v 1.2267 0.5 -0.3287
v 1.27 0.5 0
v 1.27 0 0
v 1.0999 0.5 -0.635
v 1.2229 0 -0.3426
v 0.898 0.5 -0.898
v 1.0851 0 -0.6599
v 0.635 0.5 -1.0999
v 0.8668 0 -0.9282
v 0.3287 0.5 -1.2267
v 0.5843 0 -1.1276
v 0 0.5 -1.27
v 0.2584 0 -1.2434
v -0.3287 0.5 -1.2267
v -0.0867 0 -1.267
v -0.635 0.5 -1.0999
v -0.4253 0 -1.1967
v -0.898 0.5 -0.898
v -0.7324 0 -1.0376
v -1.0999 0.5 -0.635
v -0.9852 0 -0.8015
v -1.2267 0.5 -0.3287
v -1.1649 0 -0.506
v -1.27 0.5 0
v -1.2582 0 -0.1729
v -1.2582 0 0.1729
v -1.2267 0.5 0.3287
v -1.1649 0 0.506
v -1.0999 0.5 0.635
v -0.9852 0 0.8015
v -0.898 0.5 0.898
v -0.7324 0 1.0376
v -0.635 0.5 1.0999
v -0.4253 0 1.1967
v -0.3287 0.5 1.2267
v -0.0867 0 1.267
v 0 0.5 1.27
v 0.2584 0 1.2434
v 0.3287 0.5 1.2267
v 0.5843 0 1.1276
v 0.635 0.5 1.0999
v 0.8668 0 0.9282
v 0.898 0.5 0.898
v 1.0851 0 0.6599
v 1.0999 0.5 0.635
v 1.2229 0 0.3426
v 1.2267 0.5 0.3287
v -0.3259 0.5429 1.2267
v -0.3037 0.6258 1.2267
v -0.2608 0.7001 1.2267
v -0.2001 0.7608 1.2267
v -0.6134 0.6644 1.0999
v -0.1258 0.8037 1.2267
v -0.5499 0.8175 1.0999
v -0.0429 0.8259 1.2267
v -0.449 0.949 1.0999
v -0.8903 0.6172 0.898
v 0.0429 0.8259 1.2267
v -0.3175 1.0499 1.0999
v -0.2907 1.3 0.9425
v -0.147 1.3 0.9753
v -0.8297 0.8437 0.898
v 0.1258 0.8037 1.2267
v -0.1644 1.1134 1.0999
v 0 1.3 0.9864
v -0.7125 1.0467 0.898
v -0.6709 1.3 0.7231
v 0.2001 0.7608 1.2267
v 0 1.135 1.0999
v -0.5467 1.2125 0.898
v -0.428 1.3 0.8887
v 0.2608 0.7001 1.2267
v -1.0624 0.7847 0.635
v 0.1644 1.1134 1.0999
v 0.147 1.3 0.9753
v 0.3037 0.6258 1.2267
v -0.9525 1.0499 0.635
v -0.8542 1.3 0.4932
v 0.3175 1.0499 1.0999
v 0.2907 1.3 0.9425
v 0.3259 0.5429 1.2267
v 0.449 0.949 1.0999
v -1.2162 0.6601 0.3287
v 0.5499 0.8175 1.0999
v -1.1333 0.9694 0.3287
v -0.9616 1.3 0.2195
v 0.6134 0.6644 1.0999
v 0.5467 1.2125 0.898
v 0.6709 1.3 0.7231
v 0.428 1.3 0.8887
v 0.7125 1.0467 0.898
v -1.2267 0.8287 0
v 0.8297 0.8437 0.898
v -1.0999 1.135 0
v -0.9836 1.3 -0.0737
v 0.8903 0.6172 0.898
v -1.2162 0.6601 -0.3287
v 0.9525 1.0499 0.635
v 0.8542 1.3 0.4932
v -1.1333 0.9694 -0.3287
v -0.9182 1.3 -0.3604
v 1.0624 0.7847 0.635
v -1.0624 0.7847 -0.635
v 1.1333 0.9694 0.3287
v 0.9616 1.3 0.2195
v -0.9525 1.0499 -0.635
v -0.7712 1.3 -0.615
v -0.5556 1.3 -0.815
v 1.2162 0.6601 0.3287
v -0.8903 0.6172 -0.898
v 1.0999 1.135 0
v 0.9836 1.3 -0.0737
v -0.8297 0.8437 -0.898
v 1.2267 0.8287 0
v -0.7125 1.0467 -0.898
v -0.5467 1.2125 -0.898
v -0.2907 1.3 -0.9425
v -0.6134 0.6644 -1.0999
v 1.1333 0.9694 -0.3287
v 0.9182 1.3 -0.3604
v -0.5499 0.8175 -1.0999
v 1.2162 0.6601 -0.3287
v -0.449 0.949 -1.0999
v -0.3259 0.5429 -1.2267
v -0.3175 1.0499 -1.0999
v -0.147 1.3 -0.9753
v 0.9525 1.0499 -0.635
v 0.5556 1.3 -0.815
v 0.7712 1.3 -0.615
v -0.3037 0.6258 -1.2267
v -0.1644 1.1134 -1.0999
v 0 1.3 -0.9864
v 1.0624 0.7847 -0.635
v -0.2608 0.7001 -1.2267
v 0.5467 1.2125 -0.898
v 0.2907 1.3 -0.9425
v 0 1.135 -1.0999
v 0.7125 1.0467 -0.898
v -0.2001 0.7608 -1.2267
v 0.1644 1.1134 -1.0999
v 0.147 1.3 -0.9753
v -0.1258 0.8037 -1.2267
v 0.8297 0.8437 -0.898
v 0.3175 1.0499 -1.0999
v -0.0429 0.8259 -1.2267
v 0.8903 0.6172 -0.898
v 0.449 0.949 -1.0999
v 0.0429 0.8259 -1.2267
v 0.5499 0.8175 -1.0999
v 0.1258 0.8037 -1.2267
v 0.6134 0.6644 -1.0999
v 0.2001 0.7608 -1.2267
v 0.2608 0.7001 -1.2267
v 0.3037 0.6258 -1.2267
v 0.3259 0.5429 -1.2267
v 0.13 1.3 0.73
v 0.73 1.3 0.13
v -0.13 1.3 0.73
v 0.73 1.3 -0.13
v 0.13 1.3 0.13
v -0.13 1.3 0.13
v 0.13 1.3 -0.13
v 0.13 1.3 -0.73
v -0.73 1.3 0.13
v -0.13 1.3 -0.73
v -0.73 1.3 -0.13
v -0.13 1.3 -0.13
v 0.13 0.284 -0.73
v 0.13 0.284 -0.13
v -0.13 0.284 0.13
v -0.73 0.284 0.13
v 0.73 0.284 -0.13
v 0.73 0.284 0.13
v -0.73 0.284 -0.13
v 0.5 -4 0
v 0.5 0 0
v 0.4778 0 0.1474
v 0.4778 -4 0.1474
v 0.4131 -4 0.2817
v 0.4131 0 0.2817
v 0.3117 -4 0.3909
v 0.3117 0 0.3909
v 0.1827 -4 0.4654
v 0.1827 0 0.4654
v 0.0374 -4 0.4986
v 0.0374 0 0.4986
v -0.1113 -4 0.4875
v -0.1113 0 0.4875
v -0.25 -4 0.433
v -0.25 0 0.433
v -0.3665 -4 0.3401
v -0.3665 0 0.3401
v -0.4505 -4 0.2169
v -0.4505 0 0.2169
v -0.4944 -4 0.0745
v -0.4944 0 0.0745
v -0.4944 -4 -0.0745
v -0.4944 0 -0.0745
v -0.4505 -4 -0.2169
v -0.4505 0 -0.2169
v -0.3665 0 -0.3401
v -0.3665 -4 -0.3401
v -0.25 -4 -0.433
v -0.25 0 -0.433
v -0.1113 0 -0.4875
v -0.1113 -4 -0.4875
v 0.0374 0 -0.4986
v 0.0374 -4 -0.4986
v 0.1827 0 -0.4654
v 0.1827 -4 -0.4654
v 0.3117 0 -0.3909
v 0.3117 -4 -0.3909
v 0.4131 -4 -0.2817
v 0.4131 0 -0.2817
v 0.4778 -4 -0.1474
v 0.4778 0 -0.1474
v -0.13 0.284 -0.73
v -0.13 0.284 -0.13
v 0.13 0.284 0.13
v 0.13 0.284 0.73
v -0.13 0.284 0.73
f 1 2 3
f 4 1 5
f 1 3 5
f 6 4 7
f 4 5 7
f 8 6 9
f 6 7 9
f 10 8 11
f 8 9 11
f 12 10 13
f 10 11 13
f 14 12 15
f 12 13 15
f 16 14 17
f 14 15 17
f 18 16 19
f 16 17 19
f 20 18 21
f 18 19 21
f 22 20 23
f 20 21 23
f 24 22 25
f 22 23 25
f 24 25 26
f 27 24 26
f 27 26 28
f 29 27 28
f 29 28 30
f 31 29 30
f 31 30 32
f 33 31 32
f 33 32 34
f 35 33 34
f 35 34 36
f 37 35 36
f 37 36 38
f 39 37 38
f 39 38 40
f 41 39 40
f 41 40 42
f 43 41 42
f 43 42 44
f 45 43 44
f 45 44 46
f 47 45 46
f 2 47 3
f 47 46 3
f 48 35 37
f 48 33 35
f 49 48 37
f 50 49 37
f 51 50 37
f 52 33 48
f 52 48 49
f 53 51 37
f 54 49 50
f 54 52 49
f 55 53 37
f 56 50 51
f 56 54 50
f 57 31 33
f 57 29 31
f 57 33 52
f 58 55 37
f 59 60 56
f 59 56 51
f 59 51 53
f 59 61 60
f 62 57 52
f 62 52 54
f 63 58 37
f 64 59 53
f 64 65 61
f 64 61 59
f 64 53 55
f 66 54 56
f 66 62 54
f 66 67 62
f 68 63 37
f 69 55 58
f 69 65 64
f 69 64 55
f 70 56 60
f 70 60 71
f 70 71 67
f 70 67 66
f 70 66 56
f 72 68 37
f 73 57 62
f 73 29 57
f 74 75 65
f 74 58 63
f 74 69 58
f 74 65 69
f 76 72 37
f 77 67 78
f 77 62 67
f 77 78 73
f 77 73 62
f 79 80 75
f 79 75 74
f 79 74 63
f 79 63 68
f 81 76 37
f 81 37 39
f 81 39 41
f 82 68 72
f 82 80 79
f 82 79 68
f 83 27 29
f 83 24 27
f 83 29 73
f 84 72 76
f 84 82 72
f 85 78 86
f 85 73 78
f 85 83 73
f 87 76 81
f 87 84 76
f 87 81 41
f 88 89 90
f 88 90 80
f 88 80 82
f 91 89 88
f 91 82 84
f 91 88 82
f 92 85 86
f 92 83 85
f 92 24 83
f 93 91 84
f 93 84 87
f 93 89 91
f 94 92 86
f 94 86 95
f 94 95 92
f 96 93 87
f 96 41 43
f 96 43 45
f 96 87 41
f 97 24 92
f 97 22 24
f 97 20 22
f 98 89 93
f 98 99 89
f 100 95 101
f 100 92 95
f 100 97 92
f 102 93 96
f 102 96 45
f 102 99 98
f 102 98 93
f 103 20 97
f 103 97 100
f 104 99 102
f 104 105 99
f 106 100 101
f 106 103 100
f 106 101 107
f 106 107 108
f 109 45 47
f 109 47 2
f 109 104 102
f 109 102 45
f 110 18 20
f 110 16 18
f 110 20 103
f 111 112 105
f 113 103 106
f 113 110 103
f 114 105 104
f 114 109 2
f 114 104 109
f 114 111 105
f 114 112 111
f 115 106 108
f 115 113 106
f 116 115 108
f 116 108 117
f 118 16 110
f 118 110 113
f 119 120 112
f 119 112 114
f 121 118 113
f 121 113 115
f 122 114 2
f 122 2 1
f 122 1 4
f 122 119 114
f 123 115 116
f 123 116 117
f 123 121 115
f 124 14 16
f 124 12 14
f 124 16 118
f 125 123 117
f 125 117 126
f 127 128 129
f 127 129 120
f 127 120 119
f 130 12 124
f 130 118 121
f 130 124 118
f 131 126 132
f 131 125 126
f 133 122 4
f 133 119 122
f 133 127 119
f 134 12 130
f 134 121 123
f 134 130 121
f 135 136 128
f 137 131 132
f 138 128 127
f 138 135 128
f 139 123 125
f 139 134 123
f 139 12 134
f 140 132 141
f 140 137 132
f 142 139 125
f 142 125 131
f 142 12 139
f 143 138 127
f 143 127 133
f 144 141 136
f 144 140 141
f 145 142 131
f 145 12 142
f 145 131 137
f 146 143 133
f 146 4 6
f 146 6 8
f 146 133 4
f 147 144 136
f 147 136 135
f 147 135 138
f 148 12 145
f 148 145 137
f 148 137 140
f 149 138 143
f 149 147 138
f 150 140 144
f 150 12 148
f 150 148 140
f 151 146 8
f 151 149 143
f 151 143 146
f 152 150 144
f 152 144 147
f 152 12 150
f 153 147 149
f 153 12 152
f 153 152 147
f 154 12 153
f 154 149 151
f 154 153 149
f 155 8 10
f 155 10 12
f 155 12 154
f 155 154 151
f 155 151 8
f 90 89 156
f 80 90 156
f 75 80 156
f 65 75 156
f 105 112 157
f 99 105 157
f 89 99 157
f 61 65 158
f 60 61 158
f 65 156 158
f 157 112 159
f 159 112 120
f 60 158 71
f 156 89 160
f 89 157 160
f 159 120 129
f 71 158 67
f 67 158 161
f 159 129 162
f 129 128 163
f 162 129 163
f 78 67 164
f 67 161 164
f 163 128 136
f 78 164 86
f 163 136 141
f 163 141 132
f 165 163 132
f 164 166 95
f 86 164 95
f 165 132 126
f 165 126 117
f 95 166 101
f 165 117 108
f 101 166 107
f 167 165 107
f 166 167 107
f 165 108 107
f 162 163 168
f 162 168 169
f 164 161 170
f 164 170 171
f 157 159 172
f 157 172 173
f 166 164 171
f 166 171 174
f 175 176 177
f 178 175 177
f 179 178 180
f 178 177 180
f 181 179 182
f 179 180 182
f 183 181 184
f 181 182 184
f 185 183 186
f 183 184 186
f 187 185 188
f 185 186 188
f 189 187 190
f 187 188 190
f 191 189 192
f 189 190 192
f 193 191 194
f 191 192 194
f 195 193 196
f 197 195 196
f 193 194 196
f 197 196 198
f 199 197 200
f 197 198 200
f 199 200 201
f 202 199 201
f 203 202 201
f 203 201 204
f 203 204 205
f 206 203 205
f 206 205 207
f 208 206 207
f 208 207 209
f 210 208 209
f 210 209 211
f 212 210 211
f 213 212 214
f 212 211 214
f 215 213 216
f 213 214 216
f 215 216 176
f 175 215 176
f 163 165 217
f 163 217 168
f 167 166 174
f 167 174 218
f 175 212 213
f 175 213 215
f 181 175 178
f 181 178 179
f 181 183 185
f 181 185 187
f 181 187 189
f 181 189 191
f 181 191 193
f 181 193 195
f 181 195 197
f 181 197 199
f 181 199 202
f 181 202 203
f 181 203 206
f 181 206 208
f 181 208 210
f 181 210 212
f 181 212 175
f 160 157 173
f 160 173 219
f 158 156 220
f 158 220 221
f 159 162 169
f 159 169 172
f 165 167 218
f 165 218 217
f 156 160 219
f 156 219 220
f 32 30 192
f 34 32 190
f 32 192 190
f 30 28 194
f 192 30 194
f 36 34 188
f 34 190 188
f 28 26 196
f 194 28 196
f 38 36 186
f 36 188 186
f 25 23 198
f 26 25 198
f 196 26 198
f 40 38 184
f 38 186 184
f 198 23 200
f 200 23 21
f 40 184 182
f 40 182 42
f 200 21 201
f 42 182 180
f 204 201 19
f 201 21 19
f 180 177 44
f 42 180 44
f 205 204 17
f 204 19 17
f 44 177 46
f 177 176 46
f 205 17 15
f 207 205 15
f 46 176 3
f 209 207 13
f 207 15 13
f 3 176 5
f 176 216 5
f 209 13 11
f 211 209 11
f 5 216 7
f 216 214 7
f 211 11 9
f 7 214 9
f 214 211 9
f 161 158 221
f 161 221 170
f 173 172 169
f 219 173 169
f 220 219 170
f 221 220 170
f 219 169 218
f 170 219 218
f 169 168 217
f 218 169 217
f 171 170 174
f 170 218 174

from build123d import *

# Parameters (mm, degrees)
SKETCH1_R           = 1.27
BOSS_EXTRUDE1_DEPTH = 0.5
REVOLVE1_ANGLE      = 180
SKETCH4_R           = 2.5
CUT_EXTRUDE2_DEPTH  = 1.016
CUT_EXTRUDE3_DEPTH  = 1.016
SKETCH6_R           = 0.5
BOSS_EXTRUDE2_DEPTH = 4


with BuildPart() as part:
    # Sketch1 → Boss-Extrude1 (new body)
    with BuildSketch(Plane(origin=(0, 0, 0), x_dir=(1, 0, 0), z_dir=(0, 1, 0))):
        Circle(SKETCH1_R)
    extrude(amount=BOSS_EXTRUDE1_DEPTH)

    # Sketch2 → Revolve1 (revolve)
    with BuildSketch(Plane(origin=(0, 0.5, 0), x_dir=(1, 0, 0), z_dir=(0, 1, 0))):
        with BuildLine():
            Line((0, 1.27), (0, -1.27))
            ThreePointArc((0, -1.27), (-1.27, 0), (0, 1.27))
        make_face()
    revolve(axis=Axis((0, 0.5, -1.27), (0, 0, -1)), revolution_arc=REVOLVE1_ANGLE)

    # Sketch4 → Cut-Extrude2 (cut)
    with BuildSketch(Plane(origin=(0, 1.3, 0), x_dir=(-1, 0, 0), z_dir=(0, -1, 0))):
        Circle(SKETCH4_R)
    extrude(amount=-CUT_EXTRUDE2_DEPTH, mode=Mode.SUBTRACT)

    # Sketch5 → Cut-Extrude3 (cut)
    with BuildSketch(Plane(origin=(0, 1.3, 0), x_dir=(-1, 0, 0), z_dir=(0, -1, 0))):
        Polygon((0.13, 0.13), (0.13, 0.73), (-0.13, 0.73), (-0.13, 0.13), (-0.73, 0.13), (-0.73, -0.13), (-0.13, -0.13), (-0.13, -0.73), (0.13, -0.73), (0.13, -0.13), (0.73, -0.13), (0.73, 0.13), align=None)
    extrude(amount=CUT_EXTRUDE3_DEPTH, mode=Mode.SUBTRACT)

    # Sketch6 → Boss-Extrude2 (add)
    with BuildSketch(Plane.XZ):
        Circle(SKETCH6_R)
    extrude(amount=BOSS_EXTRUDE2_DEPTH)


solid = part.part
